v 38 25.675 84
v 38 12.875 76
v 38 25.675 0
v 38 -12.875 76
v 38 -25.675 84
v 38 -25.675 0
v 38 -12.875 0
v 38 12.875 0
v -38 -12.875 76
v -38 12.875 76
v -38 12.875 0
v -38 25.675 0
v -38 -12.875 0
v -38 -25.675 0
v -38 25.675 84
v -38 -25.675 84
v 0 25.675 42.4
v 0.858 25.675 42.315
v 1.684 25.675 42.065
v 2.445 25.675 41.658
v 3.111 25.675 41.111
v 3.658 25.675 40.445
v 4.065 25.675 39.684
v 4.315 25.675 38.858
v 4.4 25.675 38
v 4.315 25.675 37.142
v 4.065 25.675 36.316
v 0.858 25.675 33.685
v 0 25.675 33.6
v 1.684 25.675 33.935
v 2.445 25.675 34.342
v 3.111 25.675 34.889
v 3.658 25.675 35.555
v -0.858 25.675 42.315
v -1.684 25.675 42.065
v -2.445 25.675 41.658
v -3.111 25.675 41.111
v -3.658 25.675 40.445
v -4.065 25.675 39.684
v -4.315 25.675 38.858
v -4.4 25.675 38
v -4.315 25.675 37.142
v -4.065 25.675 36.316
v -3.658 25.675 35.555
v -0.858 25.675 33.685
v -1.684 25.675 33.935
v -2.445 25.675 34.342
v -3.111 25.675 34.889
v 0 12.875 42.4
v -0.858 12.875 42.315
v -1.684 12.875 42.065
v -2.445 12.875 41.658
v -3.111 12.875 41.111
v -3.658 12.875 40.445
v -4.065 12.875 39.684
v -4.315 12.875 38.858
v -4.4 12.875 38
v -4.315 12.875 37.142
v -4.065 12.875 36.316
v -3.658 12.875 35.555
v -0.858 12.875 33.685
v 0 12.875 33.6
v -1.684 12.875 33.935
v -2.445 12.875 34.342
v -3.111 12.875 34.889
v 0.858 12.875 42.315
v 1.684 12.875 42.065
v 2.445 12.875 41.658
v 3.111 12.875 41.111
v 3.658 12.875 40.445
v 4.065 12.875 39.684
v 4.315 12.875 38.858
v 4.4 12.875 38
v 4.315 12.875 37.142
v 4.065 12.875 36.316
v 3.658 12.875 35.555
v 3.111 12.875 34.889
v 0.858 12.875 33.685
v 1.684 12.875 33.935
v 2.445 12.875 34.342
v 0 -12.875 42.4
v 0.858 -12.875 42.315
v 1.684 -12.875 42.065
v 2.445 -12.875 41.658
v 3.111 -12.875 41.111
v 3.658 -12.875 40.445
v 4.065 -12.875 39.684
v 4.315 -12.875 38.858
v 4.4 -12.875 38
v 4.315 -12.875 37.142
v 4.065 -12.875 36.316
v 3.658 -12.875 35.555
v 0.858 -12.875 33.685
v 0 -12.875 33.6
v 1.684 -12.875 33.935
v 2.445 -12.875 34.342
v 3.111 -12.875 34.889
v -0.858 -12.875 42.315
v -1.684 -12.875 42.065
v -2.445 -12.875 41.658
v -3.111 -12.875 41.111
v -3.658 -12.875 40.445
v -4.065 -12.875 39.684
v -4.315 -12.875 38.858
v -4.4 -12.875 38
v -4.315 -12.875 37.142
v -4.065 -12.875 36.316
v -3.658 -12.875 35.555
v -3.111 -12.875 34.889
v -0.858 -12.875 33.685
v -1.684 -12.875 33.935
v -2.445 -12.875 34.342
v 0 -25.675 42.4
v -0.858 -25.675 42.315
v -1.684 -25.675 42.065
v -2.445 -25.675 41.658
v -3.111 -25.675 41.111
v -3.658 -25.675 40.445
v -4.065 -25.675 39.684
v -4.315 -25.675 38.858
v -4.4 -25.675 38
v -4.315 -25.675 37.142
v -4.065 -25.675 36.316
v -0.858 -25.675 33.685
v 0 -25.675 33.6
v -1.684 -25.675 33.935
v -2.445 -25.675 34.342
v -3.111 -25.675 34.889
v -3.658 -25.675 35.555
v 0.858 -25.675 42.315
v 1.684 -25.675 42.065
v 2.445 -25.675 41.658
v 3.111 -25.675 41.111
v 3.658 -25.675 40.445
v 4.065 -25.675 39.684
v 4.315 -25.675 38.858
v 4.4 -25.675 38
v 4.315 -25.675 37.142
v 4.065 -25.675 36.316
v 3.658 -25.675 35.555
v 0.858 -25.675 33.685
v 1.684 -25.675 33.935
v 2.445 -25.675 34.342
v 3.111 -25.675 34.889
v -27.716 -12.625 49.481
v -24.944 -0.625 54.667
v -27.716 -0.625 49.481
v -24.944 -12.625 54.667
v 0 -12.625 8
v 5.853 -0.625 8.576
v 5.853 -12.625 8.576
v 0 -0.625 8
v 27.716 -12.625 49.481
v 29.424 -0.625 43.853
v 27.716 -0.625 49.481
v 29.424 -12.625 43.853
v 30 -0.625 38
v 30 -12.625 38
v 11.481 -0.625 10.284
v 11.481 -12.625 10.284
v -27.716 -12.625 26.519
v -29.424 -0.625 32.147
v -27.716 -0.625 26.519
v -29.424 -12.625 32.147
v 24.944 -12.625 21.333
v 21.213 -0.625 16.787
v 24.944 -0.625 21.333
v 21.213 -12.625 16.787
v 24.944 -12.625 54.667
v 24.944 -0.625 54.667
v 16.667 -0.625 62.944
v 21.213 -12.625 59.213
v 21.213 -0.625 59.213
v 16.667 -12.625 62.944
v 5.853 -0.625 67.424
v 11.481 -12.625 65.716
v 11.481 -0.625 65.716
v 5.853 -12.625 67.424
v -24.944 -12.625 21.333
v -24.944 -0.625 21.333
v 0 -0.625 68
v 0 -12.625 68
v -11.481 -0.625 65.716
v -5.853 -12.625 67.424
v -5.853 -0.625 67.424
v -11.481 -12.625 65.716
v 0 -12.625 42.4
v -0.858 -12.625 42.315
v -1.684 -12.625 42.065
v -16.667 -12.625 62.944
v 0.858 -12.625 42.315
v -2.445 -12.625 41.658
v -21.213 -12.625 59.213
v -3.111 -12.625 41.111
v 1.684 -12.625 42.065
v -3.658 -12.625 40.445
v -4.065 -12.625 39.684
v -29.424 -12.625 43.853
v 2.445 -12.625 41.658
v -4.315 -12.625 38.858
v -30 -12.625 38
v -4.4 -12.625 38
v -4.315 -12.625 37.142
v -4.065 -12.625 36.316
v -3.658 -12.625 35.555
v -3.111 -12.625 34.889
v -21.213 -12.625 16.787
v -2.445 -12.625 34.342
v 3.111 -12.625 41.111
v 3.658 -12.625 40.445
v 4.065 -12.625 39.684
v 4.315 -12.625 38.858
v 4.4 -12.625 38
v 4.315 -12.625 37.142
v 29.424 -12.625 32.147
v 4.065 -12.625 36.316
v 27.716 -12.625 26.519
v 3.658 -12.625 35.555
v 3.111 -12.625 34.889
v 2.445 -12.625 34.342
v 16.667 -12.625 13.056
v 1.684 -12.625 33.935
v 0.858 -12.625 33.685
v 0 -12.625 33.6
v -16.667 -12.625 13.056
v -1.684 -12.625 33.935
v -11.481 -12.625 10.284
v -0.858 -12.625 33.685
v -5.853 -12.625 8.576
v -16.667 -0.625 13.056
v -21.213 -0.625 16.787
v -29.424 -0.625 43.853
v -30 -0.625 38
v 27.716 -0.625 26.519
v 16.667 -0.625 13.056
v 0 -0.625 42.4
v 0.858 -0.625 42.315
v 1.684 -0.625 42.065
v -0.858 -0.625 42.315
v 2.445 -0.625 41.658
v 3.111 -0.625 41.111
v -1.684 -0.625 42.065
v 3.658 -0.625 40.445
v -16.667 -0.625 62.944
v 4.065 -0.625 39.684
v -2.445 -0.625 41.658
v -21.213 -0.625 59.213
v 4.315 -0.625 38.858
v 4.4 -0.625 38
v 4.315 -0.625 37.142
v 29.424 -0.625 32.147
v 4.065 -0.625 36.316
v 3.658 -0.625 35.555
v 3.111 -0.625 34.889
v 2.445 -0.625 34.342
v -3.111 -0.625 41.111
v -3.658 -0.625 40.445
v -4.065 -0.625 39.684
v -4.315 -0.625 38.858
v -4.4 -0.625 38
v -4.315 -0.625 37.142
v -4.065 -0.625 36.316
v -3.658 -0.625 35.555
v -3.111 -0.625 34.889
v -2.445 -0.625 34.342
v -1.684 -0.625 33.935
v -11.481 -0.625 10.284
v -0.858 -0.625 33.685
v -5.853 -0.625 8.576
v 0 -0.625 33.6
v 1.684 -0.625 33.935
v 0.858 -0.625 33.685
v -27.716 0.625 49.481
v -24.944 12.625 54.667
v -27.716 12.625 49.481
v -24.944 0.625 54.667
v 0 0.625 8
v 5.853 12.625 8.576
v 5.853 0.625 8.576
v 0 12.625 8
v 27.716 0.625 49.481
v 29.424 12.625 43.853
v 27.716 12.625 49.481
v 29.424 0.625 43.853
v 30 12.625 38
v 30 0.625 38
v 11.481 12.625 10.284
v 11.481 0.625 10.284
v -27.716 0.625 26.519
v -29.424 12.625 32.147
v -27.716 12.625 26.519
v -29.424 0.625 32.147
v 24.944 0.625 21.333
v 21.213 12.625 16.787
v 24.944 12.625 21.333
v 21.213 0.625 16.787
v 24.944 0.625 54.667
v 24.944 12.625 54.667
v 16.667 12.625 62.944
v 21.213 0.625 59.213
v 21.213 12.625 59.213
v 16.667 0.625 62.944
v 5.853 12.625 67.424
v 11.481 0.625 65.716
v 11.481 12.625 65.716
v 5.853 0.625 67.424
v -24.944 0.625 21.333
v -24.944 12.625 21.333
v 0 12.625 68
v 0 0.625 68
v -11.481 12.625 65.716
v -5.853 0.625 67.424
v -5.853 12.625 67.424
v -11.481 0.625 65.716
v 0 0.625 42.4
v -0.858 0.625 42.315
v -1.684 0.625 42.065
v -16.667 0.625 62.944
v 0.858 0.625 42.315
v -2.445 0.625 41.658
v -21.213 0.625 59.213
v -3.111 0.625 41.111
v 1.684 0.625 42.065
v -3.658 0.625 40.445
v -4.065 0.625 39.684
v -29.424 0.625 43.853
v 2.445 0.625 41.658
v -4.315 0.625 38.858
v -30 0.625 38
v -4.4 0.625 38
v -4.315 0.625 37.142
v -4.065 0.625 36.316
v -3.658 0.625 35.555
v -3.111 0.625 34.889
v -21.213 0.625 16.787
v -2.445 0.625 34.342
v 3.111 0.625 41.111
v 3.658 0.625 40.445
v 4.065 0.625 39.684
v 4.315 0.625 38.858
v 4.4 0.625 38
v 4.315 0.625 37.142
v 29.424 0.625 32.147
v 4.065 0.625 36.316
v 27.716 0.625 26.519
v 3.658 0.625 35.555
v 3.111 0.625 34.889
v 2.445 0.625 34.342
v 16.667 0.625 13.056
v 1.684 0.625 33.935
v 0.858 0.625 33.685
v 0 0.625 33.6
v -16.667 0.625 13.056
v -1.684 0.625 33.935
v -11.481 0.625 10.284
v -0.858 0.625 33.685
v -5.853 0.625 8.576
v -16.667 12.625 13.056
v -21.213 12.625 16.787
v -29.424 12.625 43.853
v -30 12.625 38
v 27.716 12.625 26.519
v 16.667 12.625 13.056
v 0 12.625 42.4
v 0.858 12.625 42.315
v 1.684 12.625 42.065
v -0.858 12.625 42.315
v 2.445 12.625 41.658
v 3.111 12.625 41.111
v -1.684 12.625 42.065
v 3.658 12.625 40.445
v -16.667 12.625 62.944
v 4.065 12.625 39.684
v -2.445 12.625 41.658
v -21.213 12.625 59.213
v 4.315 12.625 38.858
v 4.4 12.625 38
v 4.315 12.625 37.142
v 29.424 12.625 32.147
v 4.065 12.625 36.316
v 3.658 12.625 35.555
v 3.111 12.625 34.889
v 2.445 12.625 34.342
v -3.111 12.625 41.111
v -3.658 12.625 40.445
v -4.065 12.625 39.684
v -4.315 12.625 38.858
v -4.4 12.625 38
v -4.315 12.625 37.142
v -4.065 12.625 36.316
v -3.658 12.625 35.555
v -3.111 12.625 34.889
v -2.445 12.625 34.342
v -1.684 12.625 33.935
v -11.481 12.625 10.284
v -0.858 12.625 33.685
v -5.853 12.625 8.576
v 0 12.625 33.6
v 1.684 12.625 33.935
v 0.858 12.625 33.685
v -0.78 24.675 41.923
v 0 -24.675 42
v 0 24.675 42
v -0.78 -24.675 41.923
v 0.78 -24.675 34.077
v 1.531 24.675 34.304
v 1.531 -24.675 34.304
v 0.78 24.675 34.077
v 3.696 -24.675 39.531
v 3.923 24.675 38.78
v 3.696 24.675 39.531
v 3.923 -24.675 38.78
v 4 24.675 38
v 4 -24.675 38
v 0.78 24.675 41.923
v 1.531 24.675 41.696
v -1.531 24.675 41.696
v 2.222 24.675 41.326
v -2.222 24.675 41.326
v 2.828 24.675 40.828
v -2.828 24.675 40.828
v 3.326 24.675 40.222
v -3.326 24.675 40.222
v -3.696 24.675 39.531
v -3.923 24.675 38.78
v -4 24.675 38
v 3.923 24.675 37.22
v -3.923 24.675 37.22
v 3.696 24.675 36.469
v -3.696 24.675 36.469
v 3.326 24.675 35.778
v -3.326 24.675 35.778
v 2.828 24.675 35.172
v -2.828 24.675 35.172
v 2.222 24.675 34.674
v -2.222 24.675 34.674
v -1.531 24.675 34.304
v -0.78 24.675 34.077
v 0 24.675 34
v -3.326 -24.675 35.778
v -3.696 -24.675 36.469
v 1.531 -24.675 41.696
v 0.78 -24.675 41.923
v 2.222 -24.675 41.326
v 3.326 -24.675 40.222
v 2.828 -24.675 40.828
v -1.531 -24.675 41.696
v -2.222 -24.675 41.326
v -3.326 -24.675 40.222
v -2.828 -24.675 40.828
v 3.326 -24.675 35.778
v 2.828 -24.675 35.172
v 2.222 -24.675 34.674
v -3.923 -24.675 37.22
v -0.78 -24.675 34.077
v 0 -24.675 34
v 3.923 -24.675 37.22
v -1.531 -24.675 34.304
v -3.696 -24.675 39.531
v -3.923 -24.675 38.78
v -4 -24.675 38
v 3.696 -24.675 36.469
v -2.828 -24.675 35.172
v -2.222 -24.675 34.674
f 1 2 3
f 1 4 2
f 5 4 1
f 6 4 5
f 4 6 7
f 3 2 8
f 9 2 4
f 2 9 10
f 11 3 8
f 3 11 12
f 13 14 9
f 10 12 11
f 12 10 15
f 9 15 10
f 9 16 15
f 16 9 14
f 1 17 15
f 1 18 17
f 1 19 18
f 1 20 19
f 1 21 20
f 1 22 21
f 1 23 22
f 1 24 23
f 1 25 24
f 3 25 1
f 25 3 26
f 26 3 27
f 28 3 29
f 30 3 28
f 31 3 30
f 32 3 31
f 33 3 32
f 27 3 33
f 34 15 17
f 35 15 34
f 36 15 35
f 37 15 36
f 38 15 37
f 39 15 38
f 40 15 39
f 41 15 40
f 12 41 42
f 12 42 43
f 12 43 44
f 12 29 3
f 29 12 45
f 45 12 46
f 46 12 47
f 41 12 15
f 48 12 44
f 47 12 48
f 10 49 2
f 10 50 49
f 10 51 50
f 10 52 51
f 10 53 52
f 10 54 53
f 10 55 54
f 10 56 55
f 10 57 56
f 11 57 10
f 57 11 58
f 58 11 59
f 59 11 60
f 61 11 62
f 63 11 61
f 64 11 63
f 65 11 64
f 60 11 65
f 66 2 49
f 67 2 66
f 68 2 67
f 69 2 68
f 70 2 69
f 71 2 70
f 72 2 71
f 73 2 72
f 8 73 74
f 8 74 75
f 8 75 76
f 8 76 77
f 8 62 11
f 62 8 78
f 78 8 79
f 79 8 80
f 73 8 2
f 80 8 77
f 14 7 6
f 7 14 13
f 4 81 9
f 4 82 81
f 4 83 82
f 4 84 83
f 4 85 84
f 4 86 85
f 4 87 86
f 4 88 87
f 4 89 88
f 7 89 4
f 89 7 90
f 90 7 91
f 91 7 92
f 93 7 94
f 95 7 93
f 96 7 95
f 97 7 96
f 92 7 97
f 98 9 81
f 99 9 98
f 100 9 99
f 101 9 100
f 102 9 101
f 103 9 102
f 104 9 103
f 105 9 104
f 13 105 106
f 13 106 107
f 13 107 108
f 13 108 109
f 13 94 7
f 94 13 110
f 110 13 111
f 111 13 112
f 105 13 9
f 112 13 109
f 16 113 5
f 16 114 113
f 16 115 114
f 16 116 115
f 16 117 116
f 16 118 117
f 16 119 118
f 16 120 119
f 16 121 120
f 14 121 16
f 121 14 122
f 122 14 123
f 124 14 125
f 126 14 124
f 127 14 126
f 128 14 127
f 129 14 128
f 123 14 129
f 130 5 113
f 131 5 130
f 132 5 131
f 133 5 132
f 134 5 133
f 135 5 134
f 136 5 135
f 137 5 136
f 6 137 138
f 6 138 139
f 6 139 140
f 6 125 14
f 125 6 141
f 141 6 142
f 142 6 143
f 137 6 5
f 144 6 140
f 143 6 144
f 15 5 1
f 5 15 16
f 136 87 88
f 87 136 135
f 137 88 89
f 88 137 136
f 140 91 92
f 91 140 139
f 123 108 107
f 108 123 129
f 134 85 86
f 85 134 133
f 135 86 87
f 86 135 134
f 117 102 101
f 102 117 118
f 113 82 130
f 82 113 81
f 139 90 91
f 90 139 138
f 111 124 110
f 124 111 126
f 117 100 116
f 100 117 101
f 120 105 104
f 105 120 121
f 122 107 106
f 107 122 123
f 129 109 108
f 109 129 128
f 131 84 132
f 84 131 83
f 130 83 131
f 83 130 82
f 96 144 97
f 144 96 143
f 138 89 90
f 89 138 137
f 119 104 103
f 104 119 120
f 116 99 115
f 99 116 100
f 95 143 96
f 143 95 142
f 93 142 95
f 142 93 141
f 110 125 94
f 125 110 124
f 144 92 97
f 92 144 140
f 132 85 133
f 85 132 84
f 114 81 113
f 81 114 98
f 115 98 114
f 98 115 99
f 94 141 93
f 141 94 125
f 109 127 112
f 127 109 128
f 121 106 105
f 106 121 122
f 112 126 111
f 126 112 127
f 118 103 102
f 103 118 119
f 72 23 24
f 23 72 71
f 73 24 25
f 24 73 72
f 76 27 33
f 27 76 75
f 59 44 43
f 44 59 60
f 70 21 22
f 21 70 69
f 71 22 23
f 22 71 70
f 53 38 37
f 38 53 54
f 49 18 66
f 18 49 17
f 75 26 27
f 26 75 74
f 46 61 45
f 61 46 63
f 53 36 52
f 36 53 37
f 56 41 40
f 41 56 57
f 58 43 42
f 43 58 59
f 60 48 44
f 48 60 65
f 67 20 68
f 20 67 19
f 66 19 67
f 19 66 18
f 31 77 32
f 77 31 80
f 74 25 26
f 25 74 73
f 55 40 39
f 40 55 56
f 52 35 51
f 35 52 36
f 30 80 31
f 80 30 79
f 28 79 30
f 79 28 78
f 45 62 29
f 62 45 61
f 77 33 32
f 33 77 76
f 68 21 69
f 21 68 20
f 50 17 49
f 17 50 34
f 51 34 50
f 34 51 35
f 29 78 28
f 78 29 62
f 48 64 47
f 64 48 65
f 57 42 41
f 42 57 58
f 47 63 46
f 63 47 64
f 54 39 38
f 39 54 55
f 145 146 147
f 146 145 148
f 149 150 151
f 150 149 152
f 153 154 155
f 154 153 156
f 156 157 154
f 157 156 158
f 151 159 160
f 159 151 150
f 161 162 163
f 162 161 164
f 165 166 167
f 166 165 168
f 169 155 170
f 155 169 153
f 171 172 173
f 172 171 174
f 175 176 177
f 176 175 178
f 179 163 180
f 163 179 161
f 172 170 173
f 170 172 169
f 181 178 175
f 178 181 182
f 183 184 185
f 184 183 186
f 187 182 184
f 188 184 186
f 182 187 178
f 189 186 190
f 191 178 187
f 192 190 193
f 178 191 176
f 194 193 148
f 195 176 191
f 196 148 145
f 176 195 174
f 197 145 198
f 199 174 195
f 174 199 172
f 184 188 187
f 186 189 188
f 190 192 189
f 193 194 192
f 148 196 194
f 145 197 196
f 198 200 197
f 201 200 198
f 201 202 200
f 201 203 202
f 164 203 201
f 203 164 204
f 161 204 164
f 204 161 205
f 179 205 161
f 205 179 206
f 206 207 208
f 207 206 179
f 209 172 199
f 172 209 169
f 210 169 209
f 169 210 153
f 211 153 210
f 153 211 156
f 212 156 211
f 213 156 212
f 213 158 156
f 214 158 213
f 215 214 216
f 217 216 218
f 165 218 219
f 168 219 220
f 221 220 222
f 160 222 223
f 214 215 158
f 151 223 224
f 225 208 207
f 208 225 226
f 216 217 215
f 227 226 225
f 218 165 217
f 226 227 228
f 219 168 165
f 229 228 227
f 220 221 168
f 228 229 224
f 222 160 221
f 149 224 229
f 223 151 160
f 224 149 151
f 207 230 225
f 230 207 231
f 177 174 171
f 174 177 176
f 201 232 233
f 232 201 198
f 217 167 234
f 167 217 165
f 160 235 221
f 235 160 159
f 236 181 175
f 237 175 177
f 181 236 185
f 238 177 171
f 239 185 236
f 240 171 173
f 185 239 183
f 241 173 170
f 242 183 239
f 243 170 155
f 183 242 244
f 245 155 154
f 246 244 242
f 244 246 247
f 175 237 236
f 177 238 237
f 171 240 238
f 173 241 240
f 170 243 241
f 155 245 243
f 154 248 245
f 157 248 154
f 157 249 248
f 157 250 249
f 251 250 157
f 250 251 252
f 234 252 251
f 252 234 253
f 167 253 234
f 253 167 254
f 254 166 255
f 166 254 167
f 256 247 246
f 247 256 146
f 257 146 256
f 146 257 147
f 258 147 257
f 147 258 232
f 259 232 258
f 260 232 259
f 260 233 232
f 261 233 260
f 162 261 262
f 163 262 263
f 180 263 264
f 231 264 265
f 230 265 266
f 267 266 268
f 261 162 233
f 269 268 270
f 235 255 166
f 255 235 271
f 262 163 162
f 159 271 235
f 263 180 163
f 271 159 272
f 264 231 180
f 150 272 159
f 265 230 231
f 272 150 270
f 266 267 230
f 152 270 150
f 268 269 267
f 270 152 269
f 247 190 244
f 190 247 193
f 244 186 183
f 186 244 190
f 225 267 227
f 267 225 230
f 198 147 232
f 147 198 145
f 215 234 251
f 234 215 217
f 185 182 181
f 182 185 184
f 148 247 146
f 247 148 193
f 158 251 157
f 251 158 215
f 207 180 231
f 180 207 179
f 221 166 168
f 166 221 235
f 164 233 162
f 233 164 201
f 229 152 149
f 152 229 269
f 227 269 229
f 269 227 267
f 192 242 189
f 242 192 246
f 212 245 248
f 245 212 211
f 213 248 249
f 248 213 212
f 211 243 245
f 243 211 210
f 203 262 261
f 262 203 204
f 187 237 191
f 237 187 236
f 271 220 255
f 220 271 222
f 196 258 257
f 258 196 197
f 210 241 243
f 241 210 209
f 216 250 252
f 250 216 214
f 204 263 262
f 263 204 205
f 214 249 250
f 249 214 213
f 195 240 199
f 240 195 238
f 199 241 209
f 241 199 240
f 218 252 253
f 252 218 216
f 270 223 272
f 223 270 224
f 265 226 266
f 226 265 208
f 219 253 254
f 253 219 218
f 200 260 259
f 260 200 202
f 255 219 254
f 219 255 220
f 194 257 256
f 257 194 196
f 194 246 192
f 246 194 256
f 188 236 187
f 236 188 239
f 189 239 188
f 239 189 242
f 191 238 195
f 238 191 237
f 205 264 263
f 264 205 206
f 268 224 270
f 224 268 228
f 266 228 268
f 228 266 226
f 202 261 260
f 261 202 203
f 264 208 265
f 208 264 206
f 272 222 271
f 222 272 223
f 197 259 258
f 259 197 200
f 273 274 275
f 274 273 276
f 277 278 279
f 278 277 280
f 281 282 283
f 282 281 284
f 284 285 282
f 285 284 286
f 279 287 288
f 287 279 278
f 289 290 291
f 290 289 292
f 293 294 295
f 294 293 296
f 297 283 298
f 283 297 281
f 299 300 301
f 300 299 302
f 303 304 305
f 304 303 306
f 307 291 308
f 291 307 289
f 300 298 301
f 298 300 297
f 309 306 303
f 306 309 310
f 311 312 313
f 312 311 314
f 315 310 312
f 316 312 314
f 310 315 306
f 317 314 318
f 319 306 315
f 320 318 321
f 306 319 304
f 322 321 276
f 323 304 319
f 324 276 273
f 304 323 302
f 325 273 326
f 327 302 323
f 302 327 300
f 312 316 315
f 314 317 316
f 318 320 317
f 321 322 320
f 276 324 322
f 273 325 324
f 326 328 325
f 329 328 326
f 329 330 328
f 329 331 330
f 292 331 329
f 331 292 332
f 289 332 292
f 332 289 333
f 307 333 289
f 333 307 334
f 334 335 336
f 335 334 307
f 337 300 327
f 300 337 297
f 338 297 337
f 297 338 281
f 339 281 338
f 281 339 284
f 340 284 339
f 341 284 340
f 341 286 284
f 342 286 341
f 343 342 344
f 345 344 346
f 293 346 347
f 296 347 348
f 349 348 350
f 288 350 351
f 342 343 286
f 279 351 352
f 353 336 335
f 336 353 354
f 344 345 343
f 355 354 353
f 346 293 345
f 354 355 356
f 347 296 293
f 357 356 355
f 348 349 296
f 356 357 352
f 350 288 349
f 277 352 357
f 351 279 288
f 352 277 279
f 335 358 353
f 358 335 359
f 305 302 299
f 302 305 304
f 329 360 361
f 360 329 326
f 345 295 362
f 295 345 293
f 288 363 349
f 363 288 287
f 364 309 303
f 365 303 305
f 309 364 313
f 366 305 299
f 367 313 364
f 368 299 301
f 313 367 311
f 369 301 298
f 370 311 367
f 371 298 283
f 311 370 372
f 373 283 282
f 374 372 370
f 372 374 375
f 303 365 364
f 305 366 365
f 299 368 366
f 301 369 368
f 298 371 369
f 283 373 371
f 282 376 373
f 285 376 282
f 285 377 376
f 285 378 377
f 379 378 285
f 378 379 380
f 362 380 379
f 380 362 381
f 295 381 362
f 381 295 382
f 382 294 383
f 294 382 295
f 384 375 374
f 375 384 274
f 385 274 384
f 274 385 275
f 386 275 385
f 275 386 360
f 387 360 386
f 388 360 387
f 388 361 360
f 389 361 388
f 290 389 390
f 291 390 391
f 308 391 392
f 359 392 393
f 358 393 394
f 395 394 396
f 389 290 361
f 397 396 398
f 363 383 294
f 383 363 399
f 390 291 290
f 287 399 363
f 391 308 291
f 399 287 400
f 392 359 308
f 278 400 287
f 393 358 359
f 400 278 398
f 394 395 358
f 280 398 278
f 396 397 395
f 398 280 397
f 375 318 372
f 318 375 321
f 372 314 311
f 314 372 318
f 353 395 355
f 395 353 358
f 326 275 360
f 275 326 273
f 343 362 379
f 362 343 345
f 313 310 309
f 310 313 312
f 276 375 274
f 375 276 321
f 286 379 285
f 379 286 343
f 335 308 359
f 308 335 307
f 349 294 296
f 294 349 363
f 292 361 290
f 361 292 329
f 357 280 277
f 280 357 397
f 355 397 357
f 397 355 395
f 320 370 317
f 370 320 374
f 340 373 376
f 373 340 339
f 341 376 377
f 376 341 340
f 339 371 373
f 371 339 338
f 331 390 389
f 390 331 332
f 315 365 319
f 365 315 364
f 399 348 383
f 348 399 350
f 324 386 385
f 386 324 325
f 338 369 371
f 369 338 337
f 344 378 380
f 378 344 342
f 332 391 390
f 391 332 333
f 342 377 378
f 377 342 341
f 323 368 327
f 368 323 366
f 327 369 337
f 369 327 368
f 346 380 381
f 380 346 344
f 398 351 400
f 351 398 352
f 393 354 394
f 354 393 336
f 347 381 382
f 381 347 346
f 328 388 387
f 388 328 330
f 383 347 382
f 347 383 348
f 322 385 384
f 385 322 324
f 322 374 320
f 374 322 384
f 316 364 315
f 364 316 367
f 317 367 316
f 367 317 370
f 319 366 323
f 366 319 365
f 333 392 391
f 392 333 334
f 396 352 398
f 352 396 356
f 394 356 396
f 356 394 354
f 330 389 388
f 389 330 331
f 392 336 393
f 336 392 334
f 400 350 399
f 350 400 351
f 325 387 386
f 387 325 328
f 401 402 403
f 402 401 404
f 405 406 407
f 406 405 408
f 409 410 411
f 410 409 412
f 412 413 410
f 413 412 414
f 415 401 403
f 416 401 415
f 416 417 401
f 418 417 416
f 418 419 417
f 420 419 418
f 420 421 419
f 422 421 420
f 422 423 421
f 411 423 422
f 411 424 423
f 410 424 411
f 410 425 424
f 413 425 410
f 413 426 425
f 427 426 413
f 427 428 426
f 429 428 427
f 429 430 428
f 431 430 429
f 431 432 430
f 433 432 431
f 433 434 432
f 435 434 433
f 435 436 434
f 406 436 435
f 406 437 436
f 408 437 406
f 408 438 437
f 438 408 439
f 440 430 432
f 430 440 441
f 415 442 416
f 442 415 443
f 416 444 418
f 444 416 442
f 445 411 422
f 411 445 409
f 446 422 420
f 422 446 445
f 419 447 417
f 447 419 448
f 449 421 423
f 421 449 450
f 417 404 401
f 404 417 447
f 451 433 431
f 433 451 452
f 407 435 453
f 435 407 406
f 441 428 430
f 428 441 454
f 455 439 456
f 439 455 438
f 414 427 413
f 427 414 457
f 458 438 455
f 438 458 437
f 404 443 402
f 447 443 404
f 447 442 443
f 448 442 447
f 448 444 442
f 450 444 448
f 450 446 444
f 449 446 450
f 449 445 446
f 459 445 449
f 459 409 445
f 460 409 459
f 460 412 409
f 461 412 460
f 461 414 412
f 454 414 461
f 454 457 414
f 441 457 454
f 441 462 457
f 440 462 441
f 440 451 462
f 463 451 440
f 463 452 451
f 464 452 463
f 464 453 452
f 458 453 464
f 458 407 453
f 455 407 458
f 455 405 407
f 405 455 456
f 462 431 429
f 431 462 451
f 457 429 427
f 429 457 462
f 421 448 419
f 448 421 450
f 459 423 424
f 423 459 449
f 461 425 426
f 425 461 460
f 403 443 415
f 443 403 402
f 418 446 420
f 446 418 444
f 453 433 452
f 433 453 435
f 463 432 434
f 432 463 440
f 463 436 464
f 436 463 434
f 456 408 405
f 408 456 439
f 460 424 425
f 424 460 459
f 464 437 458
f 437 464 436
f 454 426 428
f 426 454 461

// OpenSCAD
$fn = 32;

// ------------------------------------------------------------------------
// Trolley wheel set: wheels d60, fork 76 mm tall
// Every part is its own module, assembly() places every instance.
// ------------------------------------------------------------------------

// --- part 1 ---
module trolley_fork() {
  difference() {
    union() {
      translate([-38, 12.875, 0]) cube([76, 12.8, 76]);
      translate([-38, -25.675, 0]) cube([76, 12.8, 76]);
      translate([-38, -25.675, 76]) cube([76, 51.35, 8]);
    }
    translate([0, -19.275, 38]) rotate([90, 0, 0]) cylinder(h = 14.8, d = 8.8, center = true);
    translate([0, 19.275, 38]) rotate([90, 0, 0]) cylinder(h = 14.8, d = 8.8, center = true);
  }
}

// --- part 2 ---
module trolley_wheel() {
  difference() {
      translate([0, 0, 0]) cylinder(h = 12, d = 60);
      translate([0, 0, -1]) cylinder(h = 14, d = 8.8);
    }
}

// --- part 3 ---
module trolley_axle() {
  translate([0, 0, -24.675]) cylinder(h = 49.35, d = 8);
}

// --- assembly ---
module assembly() {
  color([0.80, 0.24, 0.20]) translate([0, 0, 0]) rotate([0, 0, 0]) trolley_fork();
  color([0.20, 0.45, 0.75]) translate([0, -0.625, 38]) rotate([90, 0, 0]) trolley_wheel();
  color([0.25, 0.62, 0.32]) translate([0, 12.625, 38]) rotate([90, 0, 0]) trolley_wheel();
  color([0.92, 0.70, 0.18]) translate([0, 0, 38]) rotate([90, 0, 0]) trolley_axle();
}

assembly();
